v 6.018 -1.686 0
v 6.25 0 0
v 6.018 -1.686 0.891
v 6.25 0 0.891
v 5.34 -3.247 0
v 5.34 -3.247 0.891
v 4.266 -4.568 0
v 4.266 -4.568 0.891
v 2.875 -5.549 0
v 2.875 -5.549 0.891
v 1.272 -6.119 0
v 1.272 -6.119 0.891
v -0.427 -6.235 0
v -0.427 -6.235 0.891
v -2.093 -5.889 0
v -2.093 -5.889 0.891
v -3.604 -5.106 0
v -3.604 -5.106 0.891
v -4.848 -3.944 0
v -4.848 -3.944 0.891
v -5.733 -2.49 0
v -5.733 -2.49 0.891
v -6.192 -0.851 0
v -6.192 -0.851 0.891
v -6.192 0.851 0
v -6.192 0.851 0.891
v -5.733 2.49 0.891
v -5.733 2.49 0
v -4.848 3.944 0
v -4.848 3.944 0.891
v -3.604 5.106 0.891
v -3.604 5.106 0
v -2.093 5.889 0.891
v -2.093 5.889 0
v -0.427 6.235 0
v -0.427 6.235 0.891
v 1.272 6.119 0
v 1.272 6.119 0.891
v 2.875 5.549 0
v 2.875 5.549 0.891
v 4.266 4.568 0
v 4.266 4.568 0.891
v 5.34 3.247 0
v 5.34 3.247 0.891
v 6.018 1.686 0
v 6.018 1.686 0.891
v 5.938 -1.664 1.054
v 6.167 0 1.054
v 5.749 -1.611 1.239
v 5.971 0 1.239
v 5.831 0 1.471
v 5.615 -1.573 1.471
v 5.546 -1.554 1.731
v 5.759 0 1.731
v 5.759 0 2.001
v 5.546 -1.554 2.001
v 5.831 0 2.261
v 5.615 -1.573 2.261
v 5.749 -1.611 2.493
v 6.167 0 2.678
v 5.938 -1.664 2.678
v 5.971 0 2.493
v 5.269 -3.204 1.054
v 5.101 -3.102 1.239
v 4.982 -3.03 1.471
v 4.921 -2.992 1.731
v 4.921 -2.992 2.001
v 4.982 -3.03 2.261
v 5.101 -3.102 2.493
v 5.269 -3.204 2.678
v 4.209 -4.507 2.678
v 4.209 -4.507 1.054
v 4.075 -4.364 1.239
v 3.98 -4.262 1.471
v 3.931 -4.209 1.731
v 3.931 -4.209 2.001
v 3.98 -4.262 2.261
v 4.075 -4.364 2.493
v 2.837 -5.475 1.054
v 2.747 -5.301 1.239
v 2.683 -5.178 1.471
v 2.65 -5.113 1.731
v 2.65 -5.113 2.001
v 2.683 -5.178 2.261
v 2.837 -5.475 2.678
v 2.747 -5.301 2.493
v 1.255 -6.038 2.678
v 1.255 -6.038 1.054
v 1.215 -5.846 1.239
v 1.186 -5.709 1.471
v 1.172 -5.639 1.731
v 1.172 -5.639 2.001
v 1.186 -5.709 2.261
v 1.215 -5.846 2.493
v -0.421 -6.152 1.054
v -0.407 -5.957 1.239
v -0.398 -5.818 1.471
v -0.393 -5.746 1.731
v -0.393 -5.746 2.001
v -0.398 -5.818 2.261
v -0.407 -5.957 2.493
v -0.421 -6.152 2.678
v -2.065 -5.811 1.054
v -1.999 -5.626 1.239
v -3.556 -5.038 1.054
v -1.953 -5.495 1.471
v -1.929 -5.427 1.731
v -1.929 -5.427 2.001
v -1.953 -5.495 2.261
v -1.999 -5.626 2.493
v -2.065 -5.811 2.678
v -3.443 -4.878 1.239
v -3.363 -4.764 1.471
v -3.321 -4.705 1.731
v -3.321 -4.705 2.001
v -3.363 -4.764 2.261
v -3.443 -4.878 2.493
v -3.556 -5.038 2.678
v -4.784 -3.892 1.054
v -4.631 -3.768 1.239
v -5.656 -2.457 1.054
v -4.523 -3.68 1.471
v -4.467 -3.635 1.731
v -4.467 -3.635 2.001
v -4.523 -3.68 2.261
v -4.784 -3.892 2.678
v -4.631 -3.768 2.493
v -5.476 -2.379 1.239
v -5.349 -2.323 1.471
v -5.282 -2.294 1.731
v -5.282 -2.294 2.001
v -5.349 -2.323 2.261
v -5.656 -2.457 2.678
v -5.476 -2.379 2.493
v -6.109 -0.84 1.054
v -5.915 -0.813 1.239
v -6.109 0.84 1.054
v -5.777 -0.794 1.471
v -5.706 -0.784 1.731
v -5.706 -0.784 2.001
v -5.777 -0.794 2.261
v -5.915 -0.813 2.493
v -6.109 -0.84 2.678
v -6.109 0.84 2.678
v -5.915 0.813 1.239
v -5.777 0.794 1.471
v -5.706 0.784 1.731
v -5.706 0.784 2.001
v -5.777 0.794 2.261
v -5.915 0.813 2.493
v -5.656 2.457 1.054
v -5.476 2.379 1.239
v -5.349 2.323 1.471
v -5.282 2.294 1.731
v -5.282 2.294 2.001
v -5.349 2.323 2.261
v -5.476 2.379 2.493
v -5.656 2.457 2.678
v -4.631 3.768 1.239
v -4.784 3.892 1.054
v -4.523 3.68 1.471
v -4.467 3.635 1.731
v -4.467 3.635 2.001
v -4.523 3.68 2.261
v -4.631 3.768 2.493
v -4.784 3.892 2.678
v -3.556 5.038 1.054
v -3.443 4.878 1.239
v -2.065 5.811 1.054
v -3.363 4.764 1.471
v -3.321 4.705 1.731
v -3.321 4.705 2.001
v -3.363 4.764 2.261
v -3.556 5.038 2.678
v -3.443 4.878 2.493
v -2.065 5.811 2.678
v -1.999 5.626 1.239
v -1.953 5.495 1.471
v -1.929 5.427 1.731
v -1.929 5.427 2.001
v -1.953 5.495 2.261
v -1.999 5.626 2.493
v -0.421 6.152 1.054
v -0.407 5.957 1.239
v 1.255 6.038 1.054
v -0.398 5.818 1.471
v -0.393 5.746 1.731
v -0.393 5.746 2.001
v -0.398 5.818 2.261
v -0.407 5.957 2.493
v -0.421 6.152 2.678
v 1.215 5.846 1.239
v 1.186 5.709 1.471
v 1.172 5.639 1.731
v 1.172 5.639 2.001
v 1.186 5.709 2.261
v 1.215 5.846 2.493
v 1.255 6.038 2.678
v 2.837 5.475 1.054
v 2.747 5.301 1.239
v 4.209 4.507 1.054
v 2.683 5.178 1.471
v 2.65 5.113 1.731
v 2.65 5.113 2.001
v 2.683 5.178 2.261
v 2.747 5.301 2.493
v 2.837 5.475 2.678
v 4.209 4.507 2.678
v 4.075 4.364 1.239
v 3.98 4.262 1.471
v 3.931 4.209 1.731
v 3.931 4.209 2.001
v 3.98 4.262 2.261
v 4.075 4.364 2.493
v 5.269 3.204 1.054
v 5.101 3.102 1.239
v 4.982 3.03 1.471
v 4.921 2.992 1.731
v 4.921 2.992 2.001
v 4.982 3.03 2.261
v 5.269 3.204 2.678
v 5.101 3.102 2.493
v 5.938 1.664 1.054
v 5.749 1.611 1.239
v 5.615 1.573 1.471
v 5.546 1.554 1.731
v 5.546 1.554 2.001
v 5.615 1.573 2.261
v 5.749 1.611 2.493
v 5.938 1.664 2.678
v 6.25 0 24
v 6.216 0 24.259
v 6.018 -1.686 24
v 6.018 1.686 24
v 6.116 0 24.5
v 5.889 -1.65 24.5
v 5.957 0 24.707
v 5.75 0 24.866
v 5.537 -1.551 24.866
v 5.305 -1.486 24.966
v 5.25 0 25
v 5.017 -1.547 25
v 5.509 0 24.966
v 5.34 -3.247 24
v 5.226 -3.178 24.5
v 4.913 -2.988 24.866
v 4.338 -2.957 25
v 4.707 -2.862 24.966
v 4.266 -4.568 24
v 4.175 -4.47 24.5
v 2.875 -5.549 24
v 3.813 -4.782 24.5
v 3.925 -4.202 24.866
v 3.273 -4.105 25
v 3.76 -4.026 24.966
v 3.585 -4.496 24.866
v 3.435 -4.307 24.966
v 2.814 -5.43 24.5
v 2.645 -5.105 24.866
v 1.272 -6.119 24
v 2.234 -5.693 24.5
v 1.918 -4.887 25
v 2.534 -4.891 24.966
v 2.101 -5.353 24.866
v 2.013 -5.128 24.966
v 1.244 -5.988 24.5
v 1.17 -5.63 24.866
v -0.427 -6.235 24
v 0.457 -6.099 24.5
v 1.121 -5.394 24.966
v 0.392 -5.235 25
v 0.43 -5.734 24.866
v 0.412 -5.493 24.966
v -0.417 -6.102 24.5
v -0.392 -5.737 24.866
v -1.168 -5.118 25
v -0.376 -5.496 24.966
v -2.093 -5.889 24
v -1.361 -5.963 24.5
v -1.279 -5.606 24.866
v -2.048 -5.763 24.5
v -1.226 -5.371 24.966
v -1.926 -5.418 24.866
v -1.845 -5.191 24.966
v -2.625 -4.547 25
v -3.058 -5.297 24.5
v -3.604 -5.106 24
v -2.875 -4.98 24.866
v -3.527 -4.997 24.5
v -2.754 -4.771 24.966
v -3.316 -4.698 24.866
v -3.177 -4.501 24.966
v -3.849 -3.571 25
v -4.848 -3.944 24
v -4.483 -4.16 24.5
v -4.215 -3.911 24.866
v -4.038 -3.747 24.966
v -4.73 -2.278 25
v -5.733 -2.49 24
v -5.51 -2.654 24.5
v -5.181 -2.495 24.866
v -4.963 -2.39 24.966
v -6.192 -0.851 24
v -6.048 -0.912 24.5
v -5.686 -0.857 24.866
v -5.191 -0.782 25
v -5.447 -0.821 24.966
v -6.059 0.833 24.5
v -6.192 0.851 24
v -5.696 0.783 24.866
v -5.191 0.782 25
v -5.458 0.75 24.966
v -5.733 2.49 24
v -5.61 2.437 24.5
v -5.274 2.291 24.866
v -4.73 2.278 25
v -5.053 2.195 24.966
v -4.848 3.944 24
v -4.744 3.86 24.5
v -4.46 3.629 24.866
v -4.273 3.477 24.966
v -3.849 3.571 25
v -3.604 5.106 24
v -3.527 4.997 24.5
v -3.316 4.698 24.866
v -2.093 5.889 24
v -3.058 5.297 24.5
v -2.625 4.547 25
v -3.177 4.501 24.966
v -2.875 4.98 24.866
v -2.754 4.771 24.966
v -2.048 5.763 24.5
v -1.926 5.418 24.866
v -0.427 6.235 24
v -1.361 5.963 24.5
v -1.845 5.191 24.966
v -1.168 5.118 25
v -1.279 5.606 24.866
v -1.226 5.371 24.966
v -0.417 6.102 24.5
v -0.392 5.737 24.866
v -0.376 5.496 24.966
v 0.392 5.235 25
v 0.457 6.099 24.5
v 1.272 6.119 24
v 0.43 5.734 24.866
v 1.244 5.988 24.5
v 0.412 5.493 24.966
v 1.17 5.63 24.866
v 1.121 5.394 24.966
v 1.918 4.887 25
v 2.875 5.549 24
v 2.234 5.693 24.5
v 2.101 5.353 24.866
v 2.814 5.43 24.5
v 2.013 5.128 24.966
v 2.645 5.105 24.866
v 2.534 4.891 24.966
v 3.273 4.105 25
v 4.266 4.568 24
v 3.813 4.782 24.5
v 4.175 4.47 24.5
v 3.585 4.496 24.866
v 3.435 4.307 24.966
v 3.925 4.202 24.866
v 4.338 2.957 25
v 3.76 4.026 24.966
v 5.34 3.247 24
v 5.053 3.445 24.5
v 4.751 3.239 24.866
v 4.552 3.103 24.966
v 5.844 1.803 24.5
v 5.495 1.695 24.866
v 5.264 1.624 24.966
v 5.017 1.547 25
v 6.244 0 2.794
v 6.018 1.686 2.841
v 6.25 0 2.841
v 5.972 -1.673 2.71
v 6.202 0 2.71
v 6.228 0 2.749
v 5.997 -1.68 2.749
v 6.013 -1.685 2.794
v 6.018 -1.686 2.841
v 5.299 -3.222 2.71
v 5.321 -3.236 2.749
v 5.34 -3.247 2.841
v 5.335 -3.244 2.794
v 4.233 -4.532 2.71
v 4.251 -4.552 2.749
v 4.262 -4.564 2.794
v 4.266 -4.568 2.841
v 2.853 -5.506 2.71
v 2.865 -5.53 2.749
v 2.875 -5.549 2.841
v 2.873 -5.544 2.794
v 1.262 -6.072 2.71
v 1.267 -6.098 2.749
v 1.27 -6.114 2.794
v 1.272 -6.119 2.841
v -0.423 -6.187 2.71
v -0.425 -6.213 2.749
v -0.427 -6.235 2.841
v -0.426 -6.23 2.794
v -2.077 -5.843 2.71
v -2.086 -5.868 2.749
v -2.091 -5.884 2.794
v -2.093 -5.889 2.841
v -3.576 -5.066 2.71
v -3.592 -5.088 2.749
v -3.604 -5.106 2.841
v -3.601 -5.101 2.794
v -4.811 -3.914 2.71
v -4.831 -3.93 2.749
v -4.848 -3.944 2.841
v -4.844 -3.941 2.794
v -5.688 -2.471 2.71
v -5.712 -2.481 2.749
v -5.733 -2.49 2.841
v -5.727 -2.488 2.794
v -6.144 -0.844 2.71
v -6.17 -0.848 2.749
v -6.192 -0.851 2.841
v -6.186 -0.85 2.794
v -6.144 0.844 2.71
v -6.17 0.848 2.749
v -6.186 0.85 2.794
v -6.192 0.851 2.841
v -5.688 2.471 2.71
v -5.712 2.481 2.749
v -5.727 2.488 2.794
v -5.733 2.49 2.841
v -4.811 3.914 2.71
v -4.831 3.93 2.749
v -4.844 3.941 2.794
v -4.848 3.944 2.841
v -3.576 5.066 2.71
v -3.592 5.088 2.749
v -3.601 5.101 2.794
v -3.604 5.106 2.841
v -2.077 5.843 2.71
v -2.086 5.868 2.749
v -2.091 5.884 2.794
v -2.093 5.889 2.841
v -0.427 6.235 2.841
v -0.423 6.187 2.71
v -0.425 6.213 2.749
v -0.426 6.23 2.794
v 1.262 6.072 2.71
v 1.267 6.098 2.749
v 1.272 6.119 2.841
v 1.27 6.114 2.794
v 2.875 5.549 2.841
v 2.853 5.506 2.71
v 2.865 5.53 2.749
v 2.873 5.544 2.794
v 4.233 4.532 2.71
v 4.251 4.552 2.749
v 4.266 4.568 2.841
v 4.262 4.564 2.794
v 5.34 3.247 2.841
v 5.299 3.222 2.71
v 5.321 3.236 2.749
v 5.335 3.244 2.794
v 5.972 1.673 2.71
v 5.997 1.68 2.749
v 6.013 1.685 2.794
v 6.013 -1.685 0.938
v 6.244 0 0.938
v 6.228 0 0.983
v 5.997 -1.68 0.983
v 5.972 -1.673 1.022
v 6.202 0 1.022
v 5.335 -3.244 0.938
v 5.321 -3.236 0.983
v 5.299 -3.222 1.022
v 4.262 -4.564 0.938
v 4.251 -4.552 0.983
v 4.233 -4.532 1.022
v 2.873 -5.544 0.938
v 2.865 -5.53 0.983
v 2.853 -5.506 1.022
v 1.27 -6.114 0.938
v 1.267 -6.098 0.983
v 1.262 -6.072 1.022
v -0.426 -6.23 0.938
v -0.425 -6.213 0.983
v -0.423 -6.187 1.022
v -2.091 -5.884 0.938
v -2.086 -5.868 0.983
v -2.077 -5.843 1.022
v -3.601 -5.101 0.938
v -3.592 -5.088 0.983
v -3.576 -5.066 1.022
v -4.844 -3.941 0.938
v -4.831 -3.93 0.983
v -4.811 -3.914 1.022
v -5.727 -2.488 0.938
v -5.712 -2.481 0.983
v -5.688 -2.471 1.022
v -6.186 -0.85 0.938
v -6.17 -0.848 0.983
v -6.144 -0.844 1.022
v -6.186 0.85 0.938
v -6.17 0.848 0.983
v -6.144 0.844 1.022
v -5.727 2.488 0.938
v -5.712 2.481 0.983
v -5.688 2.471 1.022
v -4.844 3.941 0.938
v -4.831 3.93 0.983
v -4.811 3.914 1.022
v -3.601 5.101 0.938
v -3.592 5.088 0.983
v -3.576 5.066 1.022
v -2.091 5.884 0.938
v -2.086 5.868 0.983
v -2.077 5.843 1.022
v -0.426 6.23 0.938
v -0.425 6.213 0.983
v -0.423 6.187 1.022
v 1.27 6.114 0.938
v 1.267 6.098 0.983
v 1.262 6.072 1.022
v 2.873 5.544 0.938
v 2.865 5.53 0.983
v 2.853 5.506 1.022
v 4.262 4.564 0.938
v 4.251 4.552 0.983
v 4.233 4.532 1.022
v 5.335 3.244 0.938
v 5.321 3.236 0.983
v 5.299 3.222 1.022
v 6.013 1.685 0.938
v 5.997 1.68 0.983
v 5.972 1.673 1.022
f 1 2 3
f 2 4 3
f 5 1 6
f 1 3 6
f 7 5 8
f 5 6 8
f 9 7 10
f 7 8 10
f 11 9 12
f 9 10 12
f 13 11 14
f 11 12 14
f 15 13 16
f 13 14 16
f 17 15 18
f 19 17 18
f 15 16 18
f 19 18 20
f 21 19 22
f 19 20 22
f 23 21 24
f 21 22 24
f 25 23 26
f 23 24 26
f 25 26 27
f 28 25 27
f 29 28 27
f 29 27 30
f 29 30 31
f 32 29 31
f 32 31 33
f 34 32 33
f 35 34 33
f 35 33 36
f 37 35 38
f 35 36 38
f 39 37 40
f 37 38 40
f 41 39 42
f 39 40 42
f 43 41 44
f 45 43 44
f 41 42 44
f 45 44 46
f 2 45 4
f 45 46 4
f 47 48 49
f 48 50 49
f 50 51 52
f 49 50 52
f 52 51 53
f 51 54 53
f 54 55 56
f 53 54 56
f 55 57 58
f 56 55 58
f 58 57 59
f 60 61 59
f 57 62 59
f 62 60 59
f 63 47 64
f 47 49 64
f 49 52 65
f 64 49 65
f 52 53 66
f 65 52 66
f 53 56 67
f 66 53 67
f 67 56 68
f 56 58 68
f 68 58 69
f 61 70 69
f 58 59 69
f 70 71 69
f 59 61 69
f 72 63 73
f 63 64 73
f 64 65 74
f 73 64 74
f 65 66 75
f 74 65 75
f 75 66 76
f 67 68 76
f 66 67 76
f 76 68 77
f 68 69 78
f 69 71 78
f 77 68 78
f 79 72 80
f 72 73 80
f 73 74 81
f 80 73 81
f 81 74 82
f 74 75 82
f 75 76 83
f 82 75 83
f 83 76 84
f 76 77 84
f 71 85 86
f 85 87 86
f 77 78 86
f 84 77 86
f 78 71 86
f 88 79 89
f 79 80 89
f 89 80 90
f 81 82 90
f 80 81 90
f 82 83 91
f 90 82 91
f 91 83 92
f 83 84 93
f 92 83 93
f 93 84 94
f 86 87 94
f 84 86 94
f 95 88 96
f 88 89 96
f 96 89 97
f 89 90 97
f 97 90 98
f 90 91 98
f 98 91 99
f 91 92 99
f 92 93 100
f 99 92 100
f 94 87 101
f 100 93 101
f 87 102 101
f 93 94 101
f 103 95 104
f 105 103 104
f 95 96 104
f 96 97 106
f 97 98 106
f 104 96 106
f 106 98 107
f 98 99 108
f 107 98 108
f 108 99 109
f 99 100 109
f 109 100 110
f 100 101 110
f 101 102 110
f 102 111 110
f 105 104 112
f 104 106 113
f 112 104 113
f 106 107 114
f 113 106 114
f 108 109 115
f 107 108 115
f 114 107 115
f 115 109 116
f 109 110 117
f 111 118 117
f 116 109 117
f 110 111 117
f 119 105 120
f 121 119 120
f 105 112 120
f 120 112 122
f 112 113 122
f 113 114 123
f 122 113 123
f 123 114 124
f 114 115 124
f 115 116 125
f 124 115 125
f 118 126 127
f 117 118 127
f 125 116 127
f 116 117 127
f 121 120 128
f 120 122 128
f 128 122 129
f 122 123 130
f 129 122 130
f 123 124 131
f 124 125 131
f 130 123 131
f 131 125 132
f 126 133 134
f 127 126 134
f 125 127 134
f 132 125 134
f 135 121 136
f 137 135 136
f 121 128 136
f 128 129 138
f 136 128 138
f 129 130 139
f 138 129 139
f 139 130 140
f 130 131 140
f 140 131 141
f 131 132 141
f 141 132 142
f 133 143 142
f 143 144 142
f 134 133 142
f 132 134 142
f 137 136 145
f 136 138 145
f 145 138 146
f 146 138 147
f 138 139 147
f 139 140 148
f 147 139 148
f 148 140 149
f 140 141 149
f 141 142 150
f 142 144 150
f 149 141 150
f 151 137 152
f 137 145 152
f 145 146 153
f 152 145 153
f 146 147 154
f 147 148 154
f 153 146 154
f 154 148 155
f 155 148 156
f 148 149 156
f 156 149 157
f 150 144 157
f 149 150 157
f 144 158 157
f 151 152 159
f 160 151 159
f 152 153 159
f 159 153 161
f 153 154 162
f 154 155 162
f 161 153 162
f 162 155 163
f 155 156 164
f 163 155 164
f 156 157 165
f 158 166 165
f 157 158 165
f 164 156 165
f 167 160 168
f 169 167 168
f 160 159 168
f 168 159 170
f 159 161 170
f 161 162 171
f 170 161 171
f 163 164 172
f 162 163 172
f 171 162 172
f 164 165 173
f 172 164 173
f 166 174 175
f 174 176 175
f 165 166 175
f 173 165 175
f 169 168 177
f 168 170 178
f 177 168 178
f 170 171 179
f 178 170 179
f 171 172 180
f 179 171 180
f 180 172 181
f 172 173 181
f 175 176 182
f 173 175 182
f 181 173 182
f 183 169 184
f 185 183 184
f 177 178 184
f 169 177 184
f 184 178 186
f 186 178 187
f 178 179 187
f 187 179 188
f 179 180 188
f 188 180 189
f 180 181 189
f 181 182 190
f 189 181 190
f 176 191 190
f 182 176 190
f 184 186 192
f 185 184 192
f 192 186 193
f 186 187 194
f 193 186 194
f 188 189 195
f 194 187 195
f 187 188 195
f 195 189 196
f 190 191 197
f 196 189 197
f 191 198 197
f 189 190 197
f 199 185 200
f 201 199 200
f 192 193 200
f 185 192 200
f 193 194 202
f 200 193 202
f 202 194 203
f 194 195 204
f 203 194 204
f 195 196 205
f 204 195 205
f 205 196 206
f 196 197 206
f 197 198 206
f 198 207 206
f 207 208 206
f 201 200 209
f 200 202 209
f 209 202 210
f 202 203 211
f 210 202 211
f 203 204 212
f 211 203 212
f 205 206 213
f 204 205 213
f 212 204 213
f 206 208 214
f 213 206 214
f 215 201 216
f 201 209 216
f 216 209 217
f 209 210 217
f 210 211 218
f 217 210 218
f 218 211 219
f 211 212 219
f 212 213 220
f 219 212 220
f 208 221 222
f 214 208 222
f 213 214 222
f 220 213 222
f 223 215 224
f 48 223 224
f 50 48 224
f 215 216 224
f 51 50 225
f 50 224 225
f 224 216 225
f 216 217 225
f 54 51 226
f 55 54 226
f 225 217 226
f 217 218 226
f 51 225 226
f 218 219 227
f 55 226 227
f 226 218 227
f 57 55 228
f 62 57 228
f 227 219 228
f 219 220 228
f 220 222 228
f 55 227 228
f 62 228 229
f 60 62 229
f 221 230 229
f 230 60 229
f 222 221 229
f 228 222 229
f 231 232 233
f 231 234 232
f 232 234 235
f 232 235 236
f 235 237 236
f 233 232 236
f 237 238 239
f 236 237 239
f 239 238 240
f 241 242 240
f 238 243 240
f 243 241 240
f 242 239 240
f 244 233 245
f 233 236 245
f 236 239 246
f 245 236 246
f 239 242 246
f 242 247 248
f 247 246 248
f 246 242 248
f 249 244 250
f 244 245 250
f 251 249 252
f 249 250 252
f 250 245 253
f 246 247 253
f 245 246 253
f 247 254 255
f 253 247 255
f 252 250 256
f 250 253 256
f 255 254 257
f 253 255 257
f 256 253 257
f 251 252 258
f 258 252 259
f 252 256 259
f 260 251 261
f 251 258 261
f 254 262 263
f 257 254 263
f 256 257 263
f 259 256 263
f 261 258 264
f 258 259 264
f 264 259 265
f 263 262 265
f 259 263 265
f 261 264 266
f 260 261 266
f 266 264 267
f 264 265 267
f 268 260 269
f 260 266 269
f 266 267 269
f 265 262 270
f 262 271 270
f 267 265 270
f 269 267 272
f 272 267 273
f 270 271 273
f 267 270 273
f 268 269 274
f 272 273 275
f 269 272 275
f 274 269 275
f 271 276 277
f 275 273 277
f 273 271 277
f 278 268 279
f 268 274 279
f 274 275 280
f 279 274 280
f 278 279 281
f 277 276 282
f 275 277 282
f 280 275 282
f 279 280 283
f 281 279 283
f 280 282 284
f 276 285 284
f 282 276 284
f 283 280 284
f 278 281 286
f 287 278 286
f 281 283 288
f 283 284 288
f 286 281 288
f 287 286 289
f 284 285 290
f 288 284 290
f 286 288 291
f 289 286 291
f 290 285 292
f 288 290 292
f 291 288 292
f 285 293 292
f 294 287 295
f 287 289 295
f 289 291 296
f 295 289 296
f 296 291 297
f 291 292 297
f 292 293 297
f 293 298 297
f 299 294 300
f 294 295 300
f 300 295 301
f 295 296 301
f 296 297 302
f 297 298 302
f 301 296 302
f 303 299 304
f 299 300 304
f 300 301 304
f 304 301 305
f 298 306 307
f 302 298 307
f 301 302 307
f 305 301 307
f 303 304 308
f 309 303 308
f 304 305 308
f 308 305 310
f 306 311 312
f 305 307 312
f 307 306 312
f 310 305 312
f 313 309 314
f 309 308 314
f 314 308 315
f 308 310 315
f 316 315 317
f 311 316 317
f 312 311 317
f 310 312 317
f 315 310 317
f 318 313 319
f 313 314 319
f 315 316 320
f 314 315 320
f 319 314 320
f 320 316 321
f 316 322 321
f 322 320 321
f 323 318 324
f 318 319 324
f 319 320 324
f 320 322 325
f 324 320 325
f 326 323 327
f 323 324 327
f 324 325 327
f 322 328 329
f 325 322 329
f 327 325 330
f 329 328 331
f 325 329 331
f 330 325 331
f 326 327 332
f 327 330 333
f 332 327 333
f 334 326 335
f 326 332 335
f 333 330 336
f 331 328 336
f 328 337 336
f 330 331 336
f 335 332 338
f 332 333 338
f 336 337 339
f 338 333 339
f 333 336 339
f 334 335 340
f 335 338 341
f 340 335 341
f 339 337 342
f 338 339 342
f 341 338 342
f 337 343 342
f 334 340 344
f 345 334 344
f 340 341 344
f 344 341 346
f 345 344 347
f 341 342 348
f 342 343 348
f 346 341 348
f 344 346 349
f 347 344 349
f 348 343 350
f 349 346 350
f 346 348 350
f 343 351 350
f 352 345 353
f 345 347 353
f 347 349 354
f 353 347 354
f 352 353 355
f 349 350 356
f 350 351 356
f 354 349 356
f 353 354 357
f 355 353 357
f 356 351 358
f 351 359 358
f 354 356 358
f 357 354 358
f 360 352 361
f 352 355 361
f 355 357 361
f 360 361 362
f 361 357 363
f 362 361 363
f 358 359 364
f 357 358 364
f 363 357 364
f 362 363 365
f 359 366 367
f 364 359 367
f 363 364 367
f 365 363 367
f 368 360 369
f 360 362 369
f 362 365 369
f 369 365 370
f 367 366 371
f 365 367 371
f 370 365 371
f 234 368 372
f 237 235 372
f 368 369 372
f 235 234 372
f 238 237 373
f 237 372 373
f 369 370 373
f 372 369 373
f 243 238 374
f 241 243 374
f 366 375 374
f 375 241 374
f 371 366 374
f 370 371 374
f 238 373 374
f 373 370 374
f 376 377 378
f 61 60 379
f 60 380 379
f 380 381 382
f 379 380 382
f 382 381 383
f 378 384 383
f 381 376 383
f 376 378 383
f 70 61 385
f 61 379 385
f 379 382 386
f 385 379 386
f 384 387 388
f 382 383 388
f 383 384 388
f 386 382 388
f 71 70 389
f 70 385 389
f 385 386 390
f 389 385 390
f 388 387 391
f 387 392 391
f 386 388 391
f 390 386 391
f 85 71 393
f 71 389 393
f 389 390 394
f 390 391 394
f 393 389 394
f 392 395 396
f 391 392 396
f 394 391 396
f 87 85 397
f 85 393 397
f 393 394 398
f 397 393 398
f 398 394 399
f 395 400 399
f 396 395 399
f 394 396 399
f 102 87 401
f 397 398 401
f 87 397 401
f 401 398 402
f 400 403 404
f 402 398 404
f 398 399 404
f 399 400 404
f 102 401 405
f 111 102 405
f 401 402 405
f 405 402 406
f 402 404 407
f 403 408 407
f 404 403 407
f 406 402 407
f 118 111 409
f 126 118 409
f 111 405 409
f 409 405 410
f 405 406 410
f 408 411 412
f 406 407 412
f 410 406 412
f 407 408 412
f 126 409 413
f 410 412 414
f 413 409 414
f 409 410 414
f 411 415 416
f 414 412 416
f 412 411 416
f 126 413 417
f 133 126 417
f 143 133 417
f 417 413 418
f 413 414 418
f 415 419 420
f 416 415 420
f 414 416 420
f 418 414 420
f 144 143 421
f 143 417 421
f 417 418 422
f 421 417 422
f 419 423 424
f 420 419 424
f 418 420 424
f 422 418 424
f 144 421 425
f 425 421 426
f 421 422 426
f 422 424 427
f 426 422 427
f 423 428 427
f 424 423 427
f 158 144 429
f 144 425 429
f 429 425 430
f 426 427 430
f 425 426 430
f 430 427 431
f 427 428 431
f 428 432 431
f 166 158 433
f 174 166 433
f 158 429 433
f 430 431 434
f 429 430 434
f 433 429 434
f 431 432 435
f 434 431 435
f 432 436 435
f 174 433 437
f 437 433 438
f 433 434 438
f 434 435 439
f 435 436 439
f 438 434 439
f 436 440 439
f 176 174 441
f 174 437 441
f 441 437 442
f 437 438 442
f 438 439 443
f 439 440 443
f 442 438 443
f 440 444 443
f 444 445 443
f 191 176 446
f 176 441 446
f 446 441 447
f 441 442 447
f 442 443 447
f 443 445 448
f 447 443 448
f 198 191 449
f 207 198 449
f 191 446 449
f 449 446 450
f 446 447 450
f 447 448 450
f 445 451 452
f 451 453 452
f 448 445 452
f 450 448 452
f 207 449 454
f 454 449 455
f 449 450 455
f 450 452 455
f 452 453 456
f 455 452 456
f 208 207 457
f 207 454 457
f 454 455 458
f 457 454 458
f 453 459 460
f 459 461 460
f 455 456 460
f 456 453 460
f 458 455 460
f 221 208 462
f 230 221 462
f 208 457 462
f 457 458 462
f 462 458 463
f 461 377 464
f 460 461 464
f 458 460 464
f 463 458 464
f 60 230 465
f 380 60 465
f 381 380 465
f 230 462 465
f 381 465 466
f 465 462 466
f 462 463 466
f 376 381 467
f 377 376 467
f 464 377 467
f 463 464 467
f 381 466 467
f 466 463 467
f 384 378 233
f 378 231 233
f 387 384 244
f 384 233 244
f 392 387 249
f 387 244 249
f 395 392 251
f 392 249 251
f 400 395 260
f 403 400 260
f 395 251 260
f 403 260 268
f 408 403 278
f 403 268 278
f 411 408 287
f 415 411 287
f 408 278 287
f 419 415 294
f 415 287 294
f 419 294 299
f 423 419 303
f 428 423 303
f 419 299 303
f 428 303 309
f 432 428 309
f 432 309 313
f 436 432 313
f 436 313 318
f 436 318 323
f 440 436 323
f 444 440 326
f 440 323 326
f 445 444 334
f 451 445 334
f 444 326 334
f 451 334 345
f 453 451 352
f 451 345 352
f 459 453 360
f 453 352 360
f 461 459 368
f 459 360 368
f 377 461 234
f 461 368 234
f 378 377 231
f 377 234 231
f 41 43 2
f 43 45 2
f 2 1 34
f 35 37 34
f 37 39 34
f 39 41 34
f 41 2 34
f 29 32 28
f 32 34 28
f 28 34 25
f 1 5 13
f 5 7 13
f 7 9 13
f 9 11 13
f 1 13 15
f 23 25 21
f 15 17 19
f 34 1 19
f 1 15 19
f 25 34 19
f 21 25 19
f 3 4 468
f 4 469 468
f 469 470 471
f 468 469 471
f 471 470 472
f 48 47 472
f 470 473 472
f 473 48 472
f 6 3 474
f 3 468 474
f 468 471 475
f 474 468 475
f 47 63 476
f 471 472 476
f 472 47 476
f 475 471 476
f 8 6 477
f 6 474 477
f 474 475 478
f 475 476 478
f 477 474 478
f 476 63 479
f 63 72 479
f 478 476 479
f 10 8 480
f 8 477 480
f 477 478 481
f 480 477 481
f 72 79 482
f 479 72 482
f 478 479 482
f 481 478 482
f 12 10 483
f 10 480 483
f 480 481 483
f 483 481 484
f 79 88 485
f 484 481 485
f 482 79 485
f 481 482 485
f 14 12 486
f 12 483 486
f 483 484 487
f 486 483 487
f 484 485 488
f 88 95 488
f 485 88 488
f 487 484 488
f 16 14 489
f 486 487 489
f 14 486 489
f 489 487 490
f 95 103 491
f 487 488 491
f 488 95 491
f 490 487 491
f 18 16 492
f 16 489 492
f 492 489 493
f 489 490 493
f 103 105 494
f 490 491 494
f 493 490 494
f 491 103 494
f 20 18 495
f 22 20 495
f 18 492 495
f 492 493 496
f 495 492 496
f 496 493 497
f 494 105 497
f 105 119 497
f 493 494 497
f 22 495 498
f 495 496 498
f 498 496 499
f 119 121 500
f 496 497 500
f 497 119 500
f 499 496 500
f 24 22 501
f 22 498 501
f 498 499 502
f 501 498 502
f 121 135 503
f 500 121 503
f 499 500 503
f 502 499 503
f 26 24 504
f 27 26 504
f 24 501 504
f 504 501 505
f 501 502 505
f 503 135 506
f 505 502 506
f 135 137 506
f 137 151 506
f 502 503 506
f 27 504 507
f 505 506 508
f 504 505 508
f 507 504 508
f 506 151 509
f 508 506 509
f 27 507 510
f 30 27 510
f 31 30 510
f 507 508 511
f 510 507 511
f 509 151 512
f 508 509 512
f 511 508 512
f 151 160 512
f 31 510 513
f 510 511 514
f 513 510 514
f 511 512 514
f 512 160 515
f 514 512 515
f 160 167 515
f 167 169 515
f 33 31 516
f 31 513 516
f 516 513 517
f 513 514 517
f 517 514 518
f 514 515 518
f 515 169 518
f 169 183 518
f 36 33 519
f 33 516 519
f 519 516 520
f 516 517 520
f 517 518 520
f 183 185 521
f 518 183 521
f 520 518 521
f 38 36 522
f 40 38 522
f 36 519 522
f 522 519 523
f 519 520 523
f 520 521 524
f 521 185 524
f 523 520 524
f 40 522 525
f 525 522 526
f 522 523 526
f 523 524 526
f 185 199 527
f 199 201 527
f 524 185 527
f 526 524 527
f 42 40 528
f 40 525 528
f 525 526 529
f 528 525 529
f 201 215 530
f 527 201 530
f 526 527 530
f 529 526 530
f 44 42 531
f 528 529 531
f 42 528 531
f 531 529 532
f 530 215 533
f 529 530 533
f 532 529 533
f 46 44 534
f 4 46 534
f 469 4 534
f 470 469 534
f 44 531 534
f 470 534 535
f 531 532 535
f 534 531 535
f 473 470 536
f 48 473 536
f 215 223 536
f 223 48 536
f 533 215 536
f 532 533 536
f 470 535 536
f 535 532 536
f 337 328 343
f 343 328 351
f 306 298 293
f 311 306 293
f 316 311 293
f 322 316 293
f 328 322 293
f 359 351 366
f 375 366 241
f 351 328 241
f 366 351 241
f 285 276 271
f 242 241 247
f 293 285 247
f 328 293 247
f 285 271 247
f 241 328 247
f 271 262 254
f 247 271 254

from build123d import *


with BuildPart() as f1:
    # F0 (on Front) → F1 (revolve)
    with BuildSketch(Plane.XZ):
        with BuildLine():
            Line((0, 25), (0, 0))
            Line((0, 0), (6.25, 0))
            Line((6.25, 0), (6.25, 0.891346))
            ThreePointArc((6.25, 0.891346), (6.227951, 0.982633), (6.166667, 1.053793))
            ThreePointArc((6.166667, 1.053793), (5.75, 1.866025), (6.166667, 2.678258))
            ThreePointArc((6.166667, 2.678258), (6.227951, 2.749418), (6.25, 2.840705))
            Line((6.25, 2.840705), (6.25, 24))
            ThreePointArc((6.25, 24), (5.957107, 24.707107), (5.25, 25))
            Line((5.25, 25), (0, 25))
        make_face()
    revolve(axis=Axis((0, 0, 12.5), (0, 0, -1)))


solid = f1.part
